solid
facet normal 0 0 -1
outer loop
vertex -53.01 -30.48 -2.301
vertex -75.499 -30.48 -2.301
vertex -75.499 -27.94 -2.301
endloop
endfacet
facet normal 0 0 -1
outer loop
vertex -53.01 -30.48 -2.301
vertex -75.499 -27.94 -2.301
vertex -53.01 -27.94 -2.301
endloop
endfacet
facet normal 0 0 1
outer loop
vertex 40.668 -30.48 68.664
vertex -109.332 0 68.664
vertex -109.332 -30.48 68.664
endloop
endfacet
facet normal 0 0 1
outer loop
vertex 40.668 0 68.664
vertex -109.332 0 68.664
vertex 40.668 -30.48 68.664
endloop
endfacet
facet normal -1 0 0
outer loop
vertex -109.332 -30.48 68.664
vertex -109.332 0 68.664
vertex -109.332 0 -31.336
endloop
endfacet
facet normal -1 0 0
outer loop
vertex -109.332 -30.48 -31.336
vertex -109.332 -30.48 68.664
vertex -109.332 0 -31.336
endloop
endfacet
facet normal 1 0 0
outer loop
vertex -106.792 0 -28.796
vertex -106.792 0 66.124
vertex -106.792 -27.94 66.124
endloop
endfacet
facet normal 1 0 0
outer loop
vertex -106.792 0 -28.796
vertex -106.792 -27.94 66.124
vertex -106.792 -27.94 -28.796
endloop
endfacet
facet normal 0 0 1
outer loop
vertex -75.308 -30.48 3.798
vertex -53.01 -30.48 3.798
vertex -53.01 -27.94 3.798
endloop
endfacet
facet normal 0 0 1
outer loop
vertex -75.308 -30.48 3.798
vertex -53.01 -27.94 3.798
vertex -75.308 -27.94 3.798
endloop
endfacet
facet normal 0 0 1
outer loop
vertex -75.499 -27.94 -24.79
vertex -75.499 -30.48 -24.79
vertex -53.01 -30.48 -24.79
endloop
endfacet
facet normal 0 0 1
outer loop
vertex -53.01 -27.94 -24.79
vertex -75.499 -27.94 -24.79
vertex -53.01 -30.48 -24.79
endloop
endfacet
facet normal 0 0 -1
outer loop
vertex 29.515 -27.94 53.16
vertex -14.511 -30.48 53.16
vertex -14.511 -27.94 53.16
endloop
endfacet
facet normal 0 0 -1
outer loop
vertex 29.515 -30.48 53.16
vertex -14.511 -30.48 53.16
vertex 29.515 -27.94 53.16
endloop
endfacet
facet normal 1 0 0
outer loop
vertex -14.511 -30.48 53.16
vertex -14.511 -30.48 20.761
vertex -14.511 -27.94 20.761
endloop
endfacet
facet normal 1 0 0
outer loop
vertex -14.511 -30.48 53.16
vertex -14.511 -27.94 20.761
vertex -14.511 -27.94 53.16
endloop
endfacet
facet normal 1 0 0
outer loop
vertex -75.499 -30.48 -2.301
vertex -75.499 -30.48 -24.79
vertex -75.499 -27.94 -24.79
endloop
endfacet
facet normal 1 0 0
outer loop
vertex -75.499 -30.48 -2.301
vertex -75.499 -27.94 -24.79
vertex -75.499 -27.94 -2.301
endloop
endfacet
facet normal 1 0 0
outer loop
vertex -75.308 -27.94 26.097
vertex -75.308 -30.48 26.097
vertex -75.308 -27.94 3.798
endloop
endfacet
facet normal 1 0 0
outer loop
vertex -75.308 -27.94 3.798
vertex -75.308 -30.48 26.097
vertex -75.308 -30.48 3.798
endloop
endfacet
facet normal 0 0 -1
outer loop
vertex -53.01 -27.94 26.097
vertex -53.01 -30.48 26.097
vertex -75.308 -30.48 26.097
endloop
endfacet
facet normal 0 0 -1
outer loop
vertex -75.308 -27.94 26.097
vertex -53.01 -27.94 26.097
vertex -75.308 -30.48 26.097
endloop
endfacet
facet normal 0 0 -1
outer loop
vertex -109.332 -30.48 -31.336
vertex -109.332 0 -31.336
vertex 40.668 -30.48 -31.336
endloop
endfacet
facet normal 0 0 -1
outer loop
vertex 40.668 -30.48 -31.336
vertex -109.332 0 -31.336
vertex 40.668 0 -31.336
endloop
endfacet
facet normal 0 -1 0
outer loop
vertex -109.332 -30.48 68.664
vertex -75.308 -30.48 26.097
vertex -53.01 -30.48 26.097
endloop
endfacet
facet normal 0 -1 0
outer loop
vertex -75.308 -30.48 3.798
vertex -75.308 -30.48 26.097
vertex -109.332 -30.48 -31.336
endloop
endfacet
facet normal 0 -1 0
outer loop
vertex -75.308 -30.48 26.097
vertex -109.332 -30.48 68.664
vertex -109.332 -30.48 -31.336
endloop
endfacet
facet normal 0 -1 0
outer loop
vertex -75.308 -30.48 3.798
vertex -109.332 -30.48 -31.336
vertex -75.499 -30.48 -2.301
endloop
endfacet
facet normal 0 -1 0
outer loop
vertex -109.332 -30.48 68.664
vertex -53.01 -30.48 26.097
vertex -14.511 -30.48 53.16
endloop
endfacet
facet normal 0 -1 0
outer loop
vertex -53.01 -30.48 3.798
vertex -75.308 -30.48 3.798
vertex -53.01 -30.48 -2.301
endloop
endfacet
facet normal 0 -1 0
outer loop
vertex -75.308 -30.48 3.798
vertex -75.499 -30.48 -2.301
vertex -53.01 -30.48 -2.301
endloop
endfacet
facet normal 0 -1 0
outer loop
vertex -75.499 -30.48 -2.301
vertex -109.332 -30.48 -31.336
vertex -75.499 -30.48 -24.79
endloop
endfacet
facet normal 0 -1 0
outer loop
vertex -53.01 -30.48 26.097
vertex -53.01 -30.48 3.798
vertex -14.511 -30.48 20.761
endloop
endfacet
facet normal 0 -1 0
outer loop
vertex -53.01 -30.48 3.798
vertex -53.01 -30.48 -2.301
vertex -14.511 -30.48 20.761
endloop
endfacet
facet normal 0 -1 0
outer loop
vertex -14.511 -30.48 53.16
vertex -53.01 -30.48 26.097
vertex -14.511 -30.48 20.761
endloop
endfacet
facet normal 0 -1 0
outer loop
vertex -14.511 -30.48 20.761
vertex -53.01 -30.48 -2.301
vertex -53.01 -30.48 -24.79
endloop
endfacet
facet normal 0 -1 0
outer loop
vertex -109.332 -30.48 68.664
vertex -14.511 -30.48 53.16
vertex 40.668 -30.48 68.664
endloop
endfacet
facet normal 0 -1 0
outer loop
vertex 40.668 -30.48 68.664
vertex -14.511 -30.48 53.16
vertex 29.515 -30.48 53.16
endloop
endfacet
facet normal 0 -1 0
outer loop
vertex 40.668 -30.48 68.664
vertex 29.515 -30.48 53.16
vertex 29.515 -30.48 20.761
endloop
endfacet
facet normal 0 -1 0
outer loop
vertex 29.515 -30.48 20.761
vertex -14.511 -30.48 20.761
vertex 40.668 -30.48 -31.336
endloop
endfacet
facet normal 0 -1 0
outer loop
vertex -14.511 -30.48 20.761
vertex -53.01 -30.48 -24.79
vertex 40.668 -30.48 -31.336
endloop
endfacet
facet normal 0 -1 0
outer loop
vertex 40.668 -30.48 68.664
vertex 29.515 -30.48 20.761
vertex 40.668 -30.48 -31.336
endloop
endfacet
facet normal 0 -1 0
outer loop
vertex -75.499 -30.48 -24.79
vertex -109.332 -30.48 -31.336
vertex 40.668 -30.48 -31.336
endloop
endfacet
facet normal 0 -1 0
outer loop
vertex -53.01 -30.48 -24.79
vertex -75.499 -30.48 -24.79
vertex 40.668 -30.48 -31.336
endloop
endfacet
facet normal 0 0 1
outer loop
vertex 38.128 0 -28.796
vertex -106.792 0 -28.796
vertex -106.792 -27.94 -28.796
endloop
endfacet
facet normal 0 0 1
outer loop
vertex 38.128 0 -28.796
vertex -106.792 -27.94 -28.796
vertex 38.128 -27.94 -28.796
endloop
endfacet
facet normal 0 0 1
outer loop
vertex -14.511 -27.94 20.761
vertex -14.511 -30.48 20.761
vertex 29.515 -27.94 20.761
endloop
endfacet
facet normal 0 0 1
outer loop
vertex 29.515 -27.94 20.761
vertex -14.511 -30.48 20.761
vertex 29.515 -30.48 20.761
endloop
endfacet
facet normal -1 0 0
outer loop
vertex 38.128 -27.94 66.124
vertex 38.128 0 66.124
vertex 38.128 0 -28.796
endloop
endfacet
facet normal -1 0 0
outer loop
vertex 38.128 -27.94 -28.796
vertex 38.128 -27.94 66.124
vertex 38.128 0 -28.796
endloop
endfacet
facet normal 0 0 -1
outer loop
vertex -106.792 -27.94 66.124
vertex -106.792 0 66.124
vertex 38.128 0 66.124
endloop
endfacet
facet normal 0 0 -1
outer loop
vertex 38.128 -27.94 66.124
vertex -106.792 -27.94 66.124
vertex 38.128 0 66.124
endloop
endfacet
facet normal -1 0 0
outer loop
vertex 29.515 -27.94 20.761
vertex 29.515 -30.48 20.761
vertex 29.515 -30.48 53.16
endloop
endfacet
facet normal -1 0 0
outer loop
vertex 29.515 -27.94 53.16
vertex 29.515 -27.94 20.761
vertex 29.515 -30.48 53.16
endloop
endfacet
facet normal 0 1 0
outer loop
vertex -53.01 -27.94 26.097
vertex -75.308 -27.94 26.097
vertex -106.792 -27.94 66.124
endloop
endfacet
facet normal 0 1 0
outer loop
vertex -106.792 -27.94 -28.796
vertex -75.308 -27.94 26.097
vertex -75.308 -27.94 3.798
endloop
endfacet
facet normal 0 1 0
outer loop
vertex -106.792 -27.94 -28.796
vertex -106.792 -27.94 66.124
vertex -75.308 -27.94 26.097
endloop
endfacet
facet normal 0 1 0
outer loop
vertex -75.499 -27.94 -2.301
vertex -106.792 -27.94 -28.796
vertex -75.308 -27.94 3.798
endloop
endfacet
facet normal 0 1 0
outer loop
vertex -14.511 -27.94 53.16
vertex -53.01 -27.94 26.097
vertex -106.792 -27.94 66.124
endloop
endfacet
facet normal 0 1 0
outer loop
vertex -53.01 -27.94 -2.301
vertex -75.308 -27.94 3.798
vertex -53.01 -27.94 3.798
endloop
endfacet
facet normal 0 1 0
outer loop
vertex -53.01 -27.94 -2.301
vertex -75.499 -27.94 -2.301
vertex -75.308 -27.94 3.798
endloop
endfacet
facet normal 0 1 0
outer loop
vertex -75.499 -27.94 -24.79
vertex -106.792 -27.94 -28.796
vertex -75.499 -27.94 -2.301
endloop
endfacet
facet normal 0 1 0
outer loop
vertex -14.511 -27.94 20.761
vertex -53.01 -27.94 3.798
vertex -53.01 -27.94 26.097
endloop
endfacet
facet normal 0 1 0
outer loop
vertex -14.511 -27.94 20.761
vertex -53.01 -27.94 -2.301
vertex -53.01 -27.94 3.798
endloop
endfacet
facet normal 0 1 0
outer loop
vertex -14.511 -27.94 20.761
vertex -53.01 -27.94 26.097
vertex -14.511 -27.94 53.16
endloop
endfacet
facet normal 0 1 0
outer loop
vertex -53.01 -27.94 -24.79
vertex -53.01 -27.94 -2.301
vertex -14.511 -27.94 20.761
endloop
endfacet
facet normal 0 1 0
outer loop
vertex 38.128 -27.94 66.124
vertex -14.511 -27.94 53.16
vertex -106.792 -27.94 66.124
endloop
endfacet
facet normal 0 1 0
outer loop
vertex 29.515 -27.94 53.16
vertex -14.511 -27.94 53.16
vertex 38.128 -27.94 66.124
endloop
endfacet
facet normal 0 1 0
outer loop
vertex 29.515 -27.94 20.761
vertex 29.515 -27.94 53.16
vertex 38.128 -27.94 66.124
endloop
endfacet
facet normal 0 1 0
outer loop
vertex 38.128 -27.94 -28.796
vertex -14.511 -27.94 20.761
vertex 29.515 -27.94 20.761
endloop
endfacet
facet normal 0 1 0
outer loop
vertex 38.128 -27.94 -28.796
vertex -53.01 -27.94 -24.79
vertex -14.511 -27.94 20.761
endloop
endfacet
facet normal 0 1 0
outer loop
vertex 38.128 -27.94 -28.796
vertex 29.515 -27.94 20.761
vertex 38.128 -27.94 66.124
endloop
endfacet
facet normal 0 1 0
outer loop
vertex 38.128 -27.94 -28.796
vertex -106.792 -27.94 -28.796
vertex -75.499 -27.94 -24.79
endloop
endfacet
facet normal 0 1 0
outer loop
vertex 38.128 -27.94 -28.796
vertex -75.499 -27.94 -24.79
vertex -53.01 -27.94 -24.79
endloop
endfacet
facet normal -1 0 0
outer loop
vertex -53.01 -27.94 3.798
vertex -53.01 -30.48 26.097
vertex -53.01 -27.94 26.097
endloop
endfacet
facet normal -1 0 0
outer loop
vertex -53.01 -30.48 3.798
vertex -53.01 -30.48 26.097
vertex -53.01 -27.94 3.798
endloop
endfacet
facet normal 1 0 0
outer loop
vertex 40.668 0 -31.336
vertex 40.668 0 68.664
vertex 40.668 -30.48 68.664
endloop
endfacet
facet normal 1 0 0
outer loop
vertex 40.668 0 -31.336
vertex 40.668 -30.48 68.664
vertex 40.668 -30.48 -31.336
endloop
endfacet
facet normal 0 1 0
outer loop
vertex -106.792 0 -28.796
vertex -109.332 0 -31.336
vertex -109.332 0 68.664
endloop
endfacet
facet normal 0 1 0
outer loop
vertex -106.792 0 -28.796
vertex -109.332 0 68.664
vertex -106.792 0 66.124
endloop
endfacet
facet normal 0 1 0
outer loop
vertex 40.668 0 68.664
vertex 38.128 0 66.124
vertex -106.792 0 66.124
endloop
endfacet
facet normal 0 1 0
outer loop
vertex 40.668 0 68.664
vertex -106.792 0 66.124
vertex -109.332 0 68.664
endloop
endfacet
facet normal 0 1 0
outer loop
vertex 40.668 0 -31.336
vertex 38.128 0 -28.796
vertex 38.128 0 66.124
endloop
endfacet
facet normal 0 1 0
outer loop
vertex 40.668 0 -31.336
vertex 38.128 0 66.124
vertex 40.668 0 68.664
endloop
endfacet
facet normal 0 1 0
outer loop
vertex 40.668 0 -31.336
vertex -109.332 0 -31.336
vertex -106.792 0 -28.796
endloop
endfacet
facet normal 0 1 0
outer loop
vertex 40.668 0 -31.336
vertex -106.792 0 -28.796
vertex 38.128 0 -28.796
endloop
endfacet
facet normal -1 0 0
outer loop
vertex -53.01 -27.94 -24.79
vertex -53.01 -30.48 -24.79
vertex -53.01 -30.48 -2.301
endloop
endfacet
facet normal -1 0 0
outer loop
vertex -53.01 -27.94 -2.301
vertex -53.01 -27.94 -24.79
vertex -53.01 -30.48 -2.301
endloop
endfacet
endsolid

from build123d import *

# Parameters (mm, degrees)
SKETCH1_W           = 150
SKETCH1_H           = 100
BOSS_EXTRUDE1_DEPTH = 30.48
SHELL1_T            = -2.54
SKETCH3_W           = 44.02563229
SKETCH3_H           = 32.399815971
CUT_EXTRUDE1_DEPTH  = 30.48
SKETCH4_W           = 22.298696875
SKETCH4_H           = 22.298696874
CUT_EXTRUDE2_DEPTH  = 30.48
SKETCH5_W           = 22.489284027
SKETCH5_H           = 22.489284027
CUT_EXTRUDE3_DEPTH  = 30.48


with BuildPart() as part:
    # Sketch1 → Boss-Extrude1 (new body)
    with BuildSketch(Plane(origin=(0, 0, 0), x_dir=(1, 0, 0), z_dir=(0, 1, 0))):
        with Locations((-34.332023576, -18.664047151)):
            Rectangle(SKETCH1_W, SKETCH1_H)
    extrude(amount=-BOSS_EXTRUDE1_DEPTH)

    # Shell1
    shell1_openings = [part.faces().sort_by_distance(p)[0] for p in [
        (-34.332023576, 0, 18.664047151),
    ]]
    offset(amount=SHELL1_T, openings=shell1_openings, kind=Kind.INTERSECTION)

    # Sketch3 → Cut-Extrude1 (cut)
    with BuildSketch(Plane.XZ.offset(30.48)):
        with Locations((7.501856458, 36.960413817)):
            Rectangle(SKETCH3_W, SKETCH3_H)
    extrude(amount=-CUT_EXTRUDE1_DEPTH, mode=Mode.SUBTRACT)

    # Sketch4 → Cut-Extrude2 (cut)
    with BuildSketch(Plane(origin=(0, -30.48, 0), x_dir=(-1, 0, 0), z_dir=(0, -1, 0))):
        with Locations((64.158912985, -14.947597672)):
            Rectangle(SKETCH4_W, SKETCH4_H)
    extrude(amount=-CUT_EXTRUDE2_DEPTH, mode=Mode.SUBTRACT)

    # Sketch5 → Cut-Extrude3 (cut)
    with BuildSketch(Plane.XZ.offset(30.48)):
        with Locations((-64.254206561, -13.545181668)):
            Rectangle(SKETCH5_W, SKETCH5_H)
    extrude(amount=-CUT_EXTRUDE3_DEPTH, mode=Mode.SUBTRACT)


solid = part.part
